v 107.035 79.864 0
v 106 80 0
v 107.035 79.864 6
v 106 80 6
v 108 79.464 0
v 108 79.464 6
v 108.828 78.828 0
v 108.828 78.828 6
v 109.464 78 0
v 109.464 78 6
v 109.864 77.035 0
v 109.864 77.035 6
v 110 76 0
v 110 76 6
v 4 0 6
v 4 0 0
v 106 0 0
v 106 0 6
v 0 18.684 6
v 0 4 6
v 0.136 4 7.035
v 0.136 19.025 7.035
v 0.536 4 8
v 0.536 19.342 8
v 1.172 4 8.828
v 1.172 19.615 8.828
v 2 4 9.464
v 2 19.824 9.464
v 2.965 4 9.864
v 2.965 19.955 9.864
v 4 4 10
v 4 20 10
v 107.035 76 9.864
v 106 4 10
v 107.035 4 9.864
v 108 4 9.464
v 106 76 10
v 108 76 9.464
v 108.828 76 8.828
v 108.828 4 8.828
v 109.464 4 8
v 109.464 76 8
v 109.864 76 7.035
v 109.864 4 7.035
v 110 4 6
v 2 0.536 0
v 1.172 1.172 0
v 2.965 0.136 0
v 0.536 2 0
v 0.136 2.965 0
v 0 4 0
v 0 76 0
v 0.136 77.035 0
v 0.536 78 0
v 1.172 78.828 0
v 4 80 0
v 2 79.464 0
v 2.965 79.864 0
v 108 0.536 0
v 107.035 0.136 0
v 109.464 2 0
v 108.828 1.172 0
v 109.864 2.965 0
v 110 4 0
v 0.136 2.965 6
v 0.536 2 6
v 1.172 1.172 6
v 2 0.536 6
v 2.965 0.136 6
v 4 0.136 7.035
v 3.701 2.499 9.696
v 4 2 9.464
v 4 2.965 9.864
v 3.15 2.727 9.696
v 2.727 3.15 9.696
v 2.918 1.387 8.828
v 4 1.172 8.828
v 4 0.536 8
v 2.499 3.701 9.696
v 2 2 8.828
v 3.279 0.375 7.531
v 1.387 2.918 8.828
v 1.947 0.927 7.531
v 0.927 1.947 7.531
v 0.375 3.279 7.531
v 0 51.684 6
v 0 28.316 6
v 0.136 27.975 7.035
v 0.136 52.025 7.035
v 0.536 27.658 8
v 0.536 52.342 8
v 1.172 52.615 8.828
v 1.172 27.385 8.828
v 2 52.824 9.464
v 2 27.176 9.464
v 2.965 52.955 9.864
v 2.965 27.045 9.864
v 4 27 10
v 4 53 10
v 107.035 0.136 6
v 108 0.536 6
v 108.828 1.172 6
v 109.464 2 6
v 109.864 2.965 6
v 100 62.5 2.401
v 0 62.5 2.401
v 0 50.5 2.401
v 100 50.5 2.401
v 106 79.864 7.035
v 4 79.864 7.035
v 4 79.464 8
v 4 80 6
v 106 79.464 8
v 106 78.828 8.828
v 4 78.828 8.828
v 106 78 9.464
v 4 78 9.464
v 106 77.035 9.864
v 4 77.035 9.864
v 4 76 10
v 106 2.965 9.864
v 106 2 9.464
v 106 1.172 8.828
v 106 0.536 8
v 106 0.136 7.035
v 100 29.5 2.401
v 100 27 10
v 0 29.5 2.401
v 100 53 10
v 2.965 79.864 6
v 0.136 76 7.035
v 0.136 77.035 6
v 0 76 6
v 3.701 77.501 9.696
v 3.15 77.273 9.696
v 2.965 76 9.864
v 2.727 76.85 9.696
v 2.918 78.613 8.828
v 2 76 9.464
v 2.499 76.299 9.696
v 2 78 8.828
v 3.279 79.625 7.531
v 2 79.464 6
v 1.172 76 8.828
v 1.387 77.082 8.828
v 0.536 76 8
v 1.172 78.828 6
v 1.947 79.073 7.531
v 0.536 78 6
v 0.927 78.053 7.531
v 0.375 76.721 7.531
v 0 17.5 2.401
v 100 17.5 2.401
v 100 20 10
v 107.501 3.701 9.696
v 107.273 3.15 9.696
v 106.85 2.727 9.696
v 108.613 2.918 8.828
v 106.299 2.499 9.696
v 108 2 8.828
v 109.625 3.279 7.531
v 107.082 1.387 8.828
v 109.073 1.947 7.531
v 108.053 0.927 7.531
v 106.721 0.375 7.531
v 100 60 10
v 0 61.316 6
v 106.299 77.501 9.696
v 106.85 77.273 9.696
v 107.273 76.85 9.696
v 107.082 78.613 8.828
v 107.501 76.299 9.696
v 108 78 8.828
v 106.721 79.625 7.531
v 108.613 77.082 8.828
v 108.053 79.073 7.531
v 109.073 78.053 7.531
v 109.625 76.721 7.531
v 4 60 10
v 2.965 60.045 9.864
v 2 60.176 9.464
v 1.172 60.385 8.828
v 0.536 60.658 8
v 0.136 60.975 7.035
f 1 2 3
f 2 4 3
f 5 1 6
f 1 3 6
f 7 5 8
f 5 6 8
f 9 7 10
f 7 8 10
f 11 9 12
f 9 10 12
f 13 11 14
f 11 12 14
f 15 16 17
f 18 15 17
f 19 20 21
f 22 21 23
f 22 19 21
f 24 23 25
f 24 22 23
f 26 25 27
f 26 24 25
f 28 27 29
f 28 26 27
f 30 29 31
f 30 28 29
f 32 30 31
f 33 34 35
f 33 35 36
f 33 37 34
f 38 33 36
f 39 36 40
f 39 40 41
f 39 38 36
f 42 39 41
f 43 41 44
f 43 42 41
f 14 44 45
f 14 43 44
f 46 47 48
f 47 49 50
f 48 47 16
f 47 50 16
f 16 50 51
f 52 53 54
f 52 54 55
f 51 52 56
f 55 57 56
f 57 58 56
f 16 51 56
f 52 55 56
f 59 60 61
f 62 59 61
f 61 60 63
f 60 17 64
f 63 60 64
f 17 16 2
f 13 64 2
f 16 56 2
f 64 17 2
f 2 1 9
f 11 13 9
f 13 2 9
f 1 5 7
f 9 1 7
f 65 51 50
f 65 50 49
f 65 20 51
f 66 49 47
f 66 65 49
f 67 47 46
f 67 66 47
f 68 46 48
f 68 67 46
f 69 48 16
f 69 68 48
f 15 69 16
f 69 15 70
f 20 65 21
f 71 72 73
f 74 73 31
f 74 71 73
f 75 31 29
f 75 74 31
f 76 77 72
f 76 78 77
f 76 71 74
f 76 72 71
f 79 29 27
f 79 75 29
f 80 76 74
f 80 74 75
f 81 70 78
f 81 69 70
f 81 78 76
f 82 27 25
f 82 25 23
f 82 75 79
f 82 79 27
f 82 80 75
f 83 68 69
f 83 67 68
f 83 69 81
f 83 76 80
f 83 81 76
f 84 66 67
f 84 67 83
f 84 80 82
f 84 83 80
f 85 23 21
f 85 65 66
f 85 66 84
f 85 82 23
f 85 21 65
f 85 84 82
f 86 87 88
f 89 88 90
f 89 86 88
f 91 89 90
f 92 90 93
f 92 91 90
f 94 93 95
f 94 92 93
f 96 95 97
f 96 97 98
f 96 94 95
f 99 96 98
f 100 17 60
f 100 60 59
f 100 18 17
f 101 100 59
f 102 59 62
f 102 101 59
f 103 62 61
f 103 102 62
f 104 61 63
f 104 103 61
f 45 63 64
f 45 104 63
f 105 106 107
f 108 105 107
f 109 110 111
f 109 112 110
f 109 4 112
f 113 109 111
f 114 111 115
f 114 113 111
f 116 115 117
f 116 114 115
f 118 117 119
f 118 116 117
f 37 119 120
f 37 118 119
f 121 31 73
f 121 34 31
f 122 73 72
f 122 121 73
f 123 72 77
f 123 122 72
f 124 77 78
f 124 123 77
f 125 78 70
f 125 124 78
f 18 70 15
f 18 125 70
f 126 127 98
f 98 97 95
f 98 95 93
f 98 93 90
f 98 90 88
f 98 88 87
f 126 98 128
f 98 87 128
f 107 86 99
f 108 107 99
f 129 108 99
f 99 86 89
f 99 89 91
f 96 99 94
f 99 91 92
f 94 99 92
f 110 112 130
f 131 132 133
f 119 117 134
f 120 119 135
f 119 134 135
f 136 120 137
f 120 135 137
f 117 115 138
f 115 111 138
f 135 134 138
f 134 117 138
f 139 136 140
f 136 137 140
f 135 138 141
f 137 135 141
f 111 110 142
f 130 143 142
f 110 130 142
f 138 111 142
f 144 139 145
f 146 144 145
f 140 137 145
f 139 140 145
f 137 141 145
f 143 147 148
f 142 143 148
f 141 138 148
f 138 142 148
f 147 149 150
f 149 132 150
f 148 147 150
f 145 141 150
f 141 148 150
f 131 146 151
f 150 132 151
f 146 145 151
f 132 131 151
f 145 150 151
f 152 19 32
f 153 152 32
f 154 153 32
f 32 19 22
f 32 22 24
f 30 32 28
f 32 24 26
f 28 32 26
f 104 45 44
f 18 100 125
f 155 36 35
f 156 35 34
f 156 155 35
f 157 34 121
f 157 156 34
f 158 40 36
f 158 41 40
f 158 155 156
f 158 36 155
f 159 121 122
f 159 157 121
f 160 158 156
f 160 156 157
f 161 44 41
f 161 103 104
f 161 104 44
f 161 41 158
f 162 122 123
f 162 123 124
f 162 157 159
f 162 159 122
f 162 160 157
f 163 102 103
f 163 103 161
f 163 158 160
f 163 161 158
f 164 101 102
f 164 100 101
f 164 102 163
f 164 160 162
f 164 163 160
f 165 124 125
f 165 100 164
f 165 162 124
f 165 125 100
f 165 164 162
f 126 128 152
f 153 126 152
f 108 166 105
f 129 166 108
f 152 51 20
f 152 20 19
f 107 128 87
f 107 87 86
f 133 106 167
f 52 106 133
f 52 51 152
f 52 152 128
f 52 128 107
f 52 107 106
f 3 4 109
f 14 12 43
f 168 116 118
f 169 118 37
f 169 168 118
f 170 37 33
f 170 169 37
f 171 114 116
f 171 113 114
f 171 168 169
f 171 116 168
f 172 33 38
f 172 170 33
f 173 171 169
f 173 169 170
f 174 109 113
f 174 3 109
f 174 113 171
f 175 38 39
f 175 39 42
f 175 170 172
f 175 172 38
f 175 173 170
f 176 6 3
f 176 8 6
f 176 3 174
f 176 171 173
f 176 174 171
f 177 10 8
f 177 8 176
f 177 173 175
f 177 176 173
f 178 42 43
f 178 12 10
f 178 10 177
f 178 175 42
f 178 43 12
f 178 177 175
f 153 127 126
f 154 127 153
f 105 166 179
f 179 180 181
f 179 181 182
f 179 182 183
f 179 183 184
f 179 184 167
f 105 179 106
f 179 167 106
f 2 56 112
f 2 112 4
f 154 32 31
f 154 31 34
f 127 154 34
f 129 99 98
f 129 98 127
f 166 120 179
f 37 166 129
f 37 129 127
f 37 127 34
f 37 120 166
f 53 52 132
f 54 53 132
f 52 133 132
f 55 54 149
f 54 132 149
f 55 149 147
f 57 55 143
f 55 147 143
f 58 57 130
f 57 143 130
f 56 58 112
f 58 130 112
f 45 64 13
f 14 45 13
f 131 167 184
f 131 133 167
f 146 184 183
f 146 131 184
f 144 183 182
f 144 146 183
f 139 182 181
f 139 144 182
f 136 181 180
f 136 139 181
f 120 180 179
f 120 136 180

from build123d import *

# Parameters (mm, degrees)
F0_W     = 110
F0_H     = 80
F1_DEPTH = 10
F3_DEPTH = 100
F4_R     = 4


with BuildPart() as f1:
    # F0 (on Top) → F1 (new body)
    with BuildSketch(Plane.XY):
        with Locations((55, 40)):
            Rectangle(F0_W, F0_H)
    extrude(amount=F1_DEPTH)

    # F2 (on face) → F3 (cut)
    with BuildSketch(Plane(origin=(0, 0, 0), x_dir=(0, -1, 0), z_dir=(-1, 0, 0))):
        Polygon((-53, 10), (-60, 10), (-62.5, 2.4006579232), (-50.5, 2.4006579232), align=None)
        Polygon((-20, 10), (-27, 10), (-29.5, 2.4006579232), (-17.5, 2.4006579232), align=None)
    extrude(amount=-F3_DEPTH, mode=Mode.SUBTRACT)

    # F4
    f4_edges = [f1.edges().sort_by_distance(p)[0] for p in [
        (0, 0, 5),
        (110, 0, 5),
        (110, 80, 5),
        (0, 80, 5),
        (55, 80, 10),
        (110, 40, 10),
        (55, 0, 10),
        (0, 10, 10),
        (0, 40, 10),
        (0, 70, 10),
    ]]
    fillet(f4_edges, radius=F4_R)


solid = f1.part
